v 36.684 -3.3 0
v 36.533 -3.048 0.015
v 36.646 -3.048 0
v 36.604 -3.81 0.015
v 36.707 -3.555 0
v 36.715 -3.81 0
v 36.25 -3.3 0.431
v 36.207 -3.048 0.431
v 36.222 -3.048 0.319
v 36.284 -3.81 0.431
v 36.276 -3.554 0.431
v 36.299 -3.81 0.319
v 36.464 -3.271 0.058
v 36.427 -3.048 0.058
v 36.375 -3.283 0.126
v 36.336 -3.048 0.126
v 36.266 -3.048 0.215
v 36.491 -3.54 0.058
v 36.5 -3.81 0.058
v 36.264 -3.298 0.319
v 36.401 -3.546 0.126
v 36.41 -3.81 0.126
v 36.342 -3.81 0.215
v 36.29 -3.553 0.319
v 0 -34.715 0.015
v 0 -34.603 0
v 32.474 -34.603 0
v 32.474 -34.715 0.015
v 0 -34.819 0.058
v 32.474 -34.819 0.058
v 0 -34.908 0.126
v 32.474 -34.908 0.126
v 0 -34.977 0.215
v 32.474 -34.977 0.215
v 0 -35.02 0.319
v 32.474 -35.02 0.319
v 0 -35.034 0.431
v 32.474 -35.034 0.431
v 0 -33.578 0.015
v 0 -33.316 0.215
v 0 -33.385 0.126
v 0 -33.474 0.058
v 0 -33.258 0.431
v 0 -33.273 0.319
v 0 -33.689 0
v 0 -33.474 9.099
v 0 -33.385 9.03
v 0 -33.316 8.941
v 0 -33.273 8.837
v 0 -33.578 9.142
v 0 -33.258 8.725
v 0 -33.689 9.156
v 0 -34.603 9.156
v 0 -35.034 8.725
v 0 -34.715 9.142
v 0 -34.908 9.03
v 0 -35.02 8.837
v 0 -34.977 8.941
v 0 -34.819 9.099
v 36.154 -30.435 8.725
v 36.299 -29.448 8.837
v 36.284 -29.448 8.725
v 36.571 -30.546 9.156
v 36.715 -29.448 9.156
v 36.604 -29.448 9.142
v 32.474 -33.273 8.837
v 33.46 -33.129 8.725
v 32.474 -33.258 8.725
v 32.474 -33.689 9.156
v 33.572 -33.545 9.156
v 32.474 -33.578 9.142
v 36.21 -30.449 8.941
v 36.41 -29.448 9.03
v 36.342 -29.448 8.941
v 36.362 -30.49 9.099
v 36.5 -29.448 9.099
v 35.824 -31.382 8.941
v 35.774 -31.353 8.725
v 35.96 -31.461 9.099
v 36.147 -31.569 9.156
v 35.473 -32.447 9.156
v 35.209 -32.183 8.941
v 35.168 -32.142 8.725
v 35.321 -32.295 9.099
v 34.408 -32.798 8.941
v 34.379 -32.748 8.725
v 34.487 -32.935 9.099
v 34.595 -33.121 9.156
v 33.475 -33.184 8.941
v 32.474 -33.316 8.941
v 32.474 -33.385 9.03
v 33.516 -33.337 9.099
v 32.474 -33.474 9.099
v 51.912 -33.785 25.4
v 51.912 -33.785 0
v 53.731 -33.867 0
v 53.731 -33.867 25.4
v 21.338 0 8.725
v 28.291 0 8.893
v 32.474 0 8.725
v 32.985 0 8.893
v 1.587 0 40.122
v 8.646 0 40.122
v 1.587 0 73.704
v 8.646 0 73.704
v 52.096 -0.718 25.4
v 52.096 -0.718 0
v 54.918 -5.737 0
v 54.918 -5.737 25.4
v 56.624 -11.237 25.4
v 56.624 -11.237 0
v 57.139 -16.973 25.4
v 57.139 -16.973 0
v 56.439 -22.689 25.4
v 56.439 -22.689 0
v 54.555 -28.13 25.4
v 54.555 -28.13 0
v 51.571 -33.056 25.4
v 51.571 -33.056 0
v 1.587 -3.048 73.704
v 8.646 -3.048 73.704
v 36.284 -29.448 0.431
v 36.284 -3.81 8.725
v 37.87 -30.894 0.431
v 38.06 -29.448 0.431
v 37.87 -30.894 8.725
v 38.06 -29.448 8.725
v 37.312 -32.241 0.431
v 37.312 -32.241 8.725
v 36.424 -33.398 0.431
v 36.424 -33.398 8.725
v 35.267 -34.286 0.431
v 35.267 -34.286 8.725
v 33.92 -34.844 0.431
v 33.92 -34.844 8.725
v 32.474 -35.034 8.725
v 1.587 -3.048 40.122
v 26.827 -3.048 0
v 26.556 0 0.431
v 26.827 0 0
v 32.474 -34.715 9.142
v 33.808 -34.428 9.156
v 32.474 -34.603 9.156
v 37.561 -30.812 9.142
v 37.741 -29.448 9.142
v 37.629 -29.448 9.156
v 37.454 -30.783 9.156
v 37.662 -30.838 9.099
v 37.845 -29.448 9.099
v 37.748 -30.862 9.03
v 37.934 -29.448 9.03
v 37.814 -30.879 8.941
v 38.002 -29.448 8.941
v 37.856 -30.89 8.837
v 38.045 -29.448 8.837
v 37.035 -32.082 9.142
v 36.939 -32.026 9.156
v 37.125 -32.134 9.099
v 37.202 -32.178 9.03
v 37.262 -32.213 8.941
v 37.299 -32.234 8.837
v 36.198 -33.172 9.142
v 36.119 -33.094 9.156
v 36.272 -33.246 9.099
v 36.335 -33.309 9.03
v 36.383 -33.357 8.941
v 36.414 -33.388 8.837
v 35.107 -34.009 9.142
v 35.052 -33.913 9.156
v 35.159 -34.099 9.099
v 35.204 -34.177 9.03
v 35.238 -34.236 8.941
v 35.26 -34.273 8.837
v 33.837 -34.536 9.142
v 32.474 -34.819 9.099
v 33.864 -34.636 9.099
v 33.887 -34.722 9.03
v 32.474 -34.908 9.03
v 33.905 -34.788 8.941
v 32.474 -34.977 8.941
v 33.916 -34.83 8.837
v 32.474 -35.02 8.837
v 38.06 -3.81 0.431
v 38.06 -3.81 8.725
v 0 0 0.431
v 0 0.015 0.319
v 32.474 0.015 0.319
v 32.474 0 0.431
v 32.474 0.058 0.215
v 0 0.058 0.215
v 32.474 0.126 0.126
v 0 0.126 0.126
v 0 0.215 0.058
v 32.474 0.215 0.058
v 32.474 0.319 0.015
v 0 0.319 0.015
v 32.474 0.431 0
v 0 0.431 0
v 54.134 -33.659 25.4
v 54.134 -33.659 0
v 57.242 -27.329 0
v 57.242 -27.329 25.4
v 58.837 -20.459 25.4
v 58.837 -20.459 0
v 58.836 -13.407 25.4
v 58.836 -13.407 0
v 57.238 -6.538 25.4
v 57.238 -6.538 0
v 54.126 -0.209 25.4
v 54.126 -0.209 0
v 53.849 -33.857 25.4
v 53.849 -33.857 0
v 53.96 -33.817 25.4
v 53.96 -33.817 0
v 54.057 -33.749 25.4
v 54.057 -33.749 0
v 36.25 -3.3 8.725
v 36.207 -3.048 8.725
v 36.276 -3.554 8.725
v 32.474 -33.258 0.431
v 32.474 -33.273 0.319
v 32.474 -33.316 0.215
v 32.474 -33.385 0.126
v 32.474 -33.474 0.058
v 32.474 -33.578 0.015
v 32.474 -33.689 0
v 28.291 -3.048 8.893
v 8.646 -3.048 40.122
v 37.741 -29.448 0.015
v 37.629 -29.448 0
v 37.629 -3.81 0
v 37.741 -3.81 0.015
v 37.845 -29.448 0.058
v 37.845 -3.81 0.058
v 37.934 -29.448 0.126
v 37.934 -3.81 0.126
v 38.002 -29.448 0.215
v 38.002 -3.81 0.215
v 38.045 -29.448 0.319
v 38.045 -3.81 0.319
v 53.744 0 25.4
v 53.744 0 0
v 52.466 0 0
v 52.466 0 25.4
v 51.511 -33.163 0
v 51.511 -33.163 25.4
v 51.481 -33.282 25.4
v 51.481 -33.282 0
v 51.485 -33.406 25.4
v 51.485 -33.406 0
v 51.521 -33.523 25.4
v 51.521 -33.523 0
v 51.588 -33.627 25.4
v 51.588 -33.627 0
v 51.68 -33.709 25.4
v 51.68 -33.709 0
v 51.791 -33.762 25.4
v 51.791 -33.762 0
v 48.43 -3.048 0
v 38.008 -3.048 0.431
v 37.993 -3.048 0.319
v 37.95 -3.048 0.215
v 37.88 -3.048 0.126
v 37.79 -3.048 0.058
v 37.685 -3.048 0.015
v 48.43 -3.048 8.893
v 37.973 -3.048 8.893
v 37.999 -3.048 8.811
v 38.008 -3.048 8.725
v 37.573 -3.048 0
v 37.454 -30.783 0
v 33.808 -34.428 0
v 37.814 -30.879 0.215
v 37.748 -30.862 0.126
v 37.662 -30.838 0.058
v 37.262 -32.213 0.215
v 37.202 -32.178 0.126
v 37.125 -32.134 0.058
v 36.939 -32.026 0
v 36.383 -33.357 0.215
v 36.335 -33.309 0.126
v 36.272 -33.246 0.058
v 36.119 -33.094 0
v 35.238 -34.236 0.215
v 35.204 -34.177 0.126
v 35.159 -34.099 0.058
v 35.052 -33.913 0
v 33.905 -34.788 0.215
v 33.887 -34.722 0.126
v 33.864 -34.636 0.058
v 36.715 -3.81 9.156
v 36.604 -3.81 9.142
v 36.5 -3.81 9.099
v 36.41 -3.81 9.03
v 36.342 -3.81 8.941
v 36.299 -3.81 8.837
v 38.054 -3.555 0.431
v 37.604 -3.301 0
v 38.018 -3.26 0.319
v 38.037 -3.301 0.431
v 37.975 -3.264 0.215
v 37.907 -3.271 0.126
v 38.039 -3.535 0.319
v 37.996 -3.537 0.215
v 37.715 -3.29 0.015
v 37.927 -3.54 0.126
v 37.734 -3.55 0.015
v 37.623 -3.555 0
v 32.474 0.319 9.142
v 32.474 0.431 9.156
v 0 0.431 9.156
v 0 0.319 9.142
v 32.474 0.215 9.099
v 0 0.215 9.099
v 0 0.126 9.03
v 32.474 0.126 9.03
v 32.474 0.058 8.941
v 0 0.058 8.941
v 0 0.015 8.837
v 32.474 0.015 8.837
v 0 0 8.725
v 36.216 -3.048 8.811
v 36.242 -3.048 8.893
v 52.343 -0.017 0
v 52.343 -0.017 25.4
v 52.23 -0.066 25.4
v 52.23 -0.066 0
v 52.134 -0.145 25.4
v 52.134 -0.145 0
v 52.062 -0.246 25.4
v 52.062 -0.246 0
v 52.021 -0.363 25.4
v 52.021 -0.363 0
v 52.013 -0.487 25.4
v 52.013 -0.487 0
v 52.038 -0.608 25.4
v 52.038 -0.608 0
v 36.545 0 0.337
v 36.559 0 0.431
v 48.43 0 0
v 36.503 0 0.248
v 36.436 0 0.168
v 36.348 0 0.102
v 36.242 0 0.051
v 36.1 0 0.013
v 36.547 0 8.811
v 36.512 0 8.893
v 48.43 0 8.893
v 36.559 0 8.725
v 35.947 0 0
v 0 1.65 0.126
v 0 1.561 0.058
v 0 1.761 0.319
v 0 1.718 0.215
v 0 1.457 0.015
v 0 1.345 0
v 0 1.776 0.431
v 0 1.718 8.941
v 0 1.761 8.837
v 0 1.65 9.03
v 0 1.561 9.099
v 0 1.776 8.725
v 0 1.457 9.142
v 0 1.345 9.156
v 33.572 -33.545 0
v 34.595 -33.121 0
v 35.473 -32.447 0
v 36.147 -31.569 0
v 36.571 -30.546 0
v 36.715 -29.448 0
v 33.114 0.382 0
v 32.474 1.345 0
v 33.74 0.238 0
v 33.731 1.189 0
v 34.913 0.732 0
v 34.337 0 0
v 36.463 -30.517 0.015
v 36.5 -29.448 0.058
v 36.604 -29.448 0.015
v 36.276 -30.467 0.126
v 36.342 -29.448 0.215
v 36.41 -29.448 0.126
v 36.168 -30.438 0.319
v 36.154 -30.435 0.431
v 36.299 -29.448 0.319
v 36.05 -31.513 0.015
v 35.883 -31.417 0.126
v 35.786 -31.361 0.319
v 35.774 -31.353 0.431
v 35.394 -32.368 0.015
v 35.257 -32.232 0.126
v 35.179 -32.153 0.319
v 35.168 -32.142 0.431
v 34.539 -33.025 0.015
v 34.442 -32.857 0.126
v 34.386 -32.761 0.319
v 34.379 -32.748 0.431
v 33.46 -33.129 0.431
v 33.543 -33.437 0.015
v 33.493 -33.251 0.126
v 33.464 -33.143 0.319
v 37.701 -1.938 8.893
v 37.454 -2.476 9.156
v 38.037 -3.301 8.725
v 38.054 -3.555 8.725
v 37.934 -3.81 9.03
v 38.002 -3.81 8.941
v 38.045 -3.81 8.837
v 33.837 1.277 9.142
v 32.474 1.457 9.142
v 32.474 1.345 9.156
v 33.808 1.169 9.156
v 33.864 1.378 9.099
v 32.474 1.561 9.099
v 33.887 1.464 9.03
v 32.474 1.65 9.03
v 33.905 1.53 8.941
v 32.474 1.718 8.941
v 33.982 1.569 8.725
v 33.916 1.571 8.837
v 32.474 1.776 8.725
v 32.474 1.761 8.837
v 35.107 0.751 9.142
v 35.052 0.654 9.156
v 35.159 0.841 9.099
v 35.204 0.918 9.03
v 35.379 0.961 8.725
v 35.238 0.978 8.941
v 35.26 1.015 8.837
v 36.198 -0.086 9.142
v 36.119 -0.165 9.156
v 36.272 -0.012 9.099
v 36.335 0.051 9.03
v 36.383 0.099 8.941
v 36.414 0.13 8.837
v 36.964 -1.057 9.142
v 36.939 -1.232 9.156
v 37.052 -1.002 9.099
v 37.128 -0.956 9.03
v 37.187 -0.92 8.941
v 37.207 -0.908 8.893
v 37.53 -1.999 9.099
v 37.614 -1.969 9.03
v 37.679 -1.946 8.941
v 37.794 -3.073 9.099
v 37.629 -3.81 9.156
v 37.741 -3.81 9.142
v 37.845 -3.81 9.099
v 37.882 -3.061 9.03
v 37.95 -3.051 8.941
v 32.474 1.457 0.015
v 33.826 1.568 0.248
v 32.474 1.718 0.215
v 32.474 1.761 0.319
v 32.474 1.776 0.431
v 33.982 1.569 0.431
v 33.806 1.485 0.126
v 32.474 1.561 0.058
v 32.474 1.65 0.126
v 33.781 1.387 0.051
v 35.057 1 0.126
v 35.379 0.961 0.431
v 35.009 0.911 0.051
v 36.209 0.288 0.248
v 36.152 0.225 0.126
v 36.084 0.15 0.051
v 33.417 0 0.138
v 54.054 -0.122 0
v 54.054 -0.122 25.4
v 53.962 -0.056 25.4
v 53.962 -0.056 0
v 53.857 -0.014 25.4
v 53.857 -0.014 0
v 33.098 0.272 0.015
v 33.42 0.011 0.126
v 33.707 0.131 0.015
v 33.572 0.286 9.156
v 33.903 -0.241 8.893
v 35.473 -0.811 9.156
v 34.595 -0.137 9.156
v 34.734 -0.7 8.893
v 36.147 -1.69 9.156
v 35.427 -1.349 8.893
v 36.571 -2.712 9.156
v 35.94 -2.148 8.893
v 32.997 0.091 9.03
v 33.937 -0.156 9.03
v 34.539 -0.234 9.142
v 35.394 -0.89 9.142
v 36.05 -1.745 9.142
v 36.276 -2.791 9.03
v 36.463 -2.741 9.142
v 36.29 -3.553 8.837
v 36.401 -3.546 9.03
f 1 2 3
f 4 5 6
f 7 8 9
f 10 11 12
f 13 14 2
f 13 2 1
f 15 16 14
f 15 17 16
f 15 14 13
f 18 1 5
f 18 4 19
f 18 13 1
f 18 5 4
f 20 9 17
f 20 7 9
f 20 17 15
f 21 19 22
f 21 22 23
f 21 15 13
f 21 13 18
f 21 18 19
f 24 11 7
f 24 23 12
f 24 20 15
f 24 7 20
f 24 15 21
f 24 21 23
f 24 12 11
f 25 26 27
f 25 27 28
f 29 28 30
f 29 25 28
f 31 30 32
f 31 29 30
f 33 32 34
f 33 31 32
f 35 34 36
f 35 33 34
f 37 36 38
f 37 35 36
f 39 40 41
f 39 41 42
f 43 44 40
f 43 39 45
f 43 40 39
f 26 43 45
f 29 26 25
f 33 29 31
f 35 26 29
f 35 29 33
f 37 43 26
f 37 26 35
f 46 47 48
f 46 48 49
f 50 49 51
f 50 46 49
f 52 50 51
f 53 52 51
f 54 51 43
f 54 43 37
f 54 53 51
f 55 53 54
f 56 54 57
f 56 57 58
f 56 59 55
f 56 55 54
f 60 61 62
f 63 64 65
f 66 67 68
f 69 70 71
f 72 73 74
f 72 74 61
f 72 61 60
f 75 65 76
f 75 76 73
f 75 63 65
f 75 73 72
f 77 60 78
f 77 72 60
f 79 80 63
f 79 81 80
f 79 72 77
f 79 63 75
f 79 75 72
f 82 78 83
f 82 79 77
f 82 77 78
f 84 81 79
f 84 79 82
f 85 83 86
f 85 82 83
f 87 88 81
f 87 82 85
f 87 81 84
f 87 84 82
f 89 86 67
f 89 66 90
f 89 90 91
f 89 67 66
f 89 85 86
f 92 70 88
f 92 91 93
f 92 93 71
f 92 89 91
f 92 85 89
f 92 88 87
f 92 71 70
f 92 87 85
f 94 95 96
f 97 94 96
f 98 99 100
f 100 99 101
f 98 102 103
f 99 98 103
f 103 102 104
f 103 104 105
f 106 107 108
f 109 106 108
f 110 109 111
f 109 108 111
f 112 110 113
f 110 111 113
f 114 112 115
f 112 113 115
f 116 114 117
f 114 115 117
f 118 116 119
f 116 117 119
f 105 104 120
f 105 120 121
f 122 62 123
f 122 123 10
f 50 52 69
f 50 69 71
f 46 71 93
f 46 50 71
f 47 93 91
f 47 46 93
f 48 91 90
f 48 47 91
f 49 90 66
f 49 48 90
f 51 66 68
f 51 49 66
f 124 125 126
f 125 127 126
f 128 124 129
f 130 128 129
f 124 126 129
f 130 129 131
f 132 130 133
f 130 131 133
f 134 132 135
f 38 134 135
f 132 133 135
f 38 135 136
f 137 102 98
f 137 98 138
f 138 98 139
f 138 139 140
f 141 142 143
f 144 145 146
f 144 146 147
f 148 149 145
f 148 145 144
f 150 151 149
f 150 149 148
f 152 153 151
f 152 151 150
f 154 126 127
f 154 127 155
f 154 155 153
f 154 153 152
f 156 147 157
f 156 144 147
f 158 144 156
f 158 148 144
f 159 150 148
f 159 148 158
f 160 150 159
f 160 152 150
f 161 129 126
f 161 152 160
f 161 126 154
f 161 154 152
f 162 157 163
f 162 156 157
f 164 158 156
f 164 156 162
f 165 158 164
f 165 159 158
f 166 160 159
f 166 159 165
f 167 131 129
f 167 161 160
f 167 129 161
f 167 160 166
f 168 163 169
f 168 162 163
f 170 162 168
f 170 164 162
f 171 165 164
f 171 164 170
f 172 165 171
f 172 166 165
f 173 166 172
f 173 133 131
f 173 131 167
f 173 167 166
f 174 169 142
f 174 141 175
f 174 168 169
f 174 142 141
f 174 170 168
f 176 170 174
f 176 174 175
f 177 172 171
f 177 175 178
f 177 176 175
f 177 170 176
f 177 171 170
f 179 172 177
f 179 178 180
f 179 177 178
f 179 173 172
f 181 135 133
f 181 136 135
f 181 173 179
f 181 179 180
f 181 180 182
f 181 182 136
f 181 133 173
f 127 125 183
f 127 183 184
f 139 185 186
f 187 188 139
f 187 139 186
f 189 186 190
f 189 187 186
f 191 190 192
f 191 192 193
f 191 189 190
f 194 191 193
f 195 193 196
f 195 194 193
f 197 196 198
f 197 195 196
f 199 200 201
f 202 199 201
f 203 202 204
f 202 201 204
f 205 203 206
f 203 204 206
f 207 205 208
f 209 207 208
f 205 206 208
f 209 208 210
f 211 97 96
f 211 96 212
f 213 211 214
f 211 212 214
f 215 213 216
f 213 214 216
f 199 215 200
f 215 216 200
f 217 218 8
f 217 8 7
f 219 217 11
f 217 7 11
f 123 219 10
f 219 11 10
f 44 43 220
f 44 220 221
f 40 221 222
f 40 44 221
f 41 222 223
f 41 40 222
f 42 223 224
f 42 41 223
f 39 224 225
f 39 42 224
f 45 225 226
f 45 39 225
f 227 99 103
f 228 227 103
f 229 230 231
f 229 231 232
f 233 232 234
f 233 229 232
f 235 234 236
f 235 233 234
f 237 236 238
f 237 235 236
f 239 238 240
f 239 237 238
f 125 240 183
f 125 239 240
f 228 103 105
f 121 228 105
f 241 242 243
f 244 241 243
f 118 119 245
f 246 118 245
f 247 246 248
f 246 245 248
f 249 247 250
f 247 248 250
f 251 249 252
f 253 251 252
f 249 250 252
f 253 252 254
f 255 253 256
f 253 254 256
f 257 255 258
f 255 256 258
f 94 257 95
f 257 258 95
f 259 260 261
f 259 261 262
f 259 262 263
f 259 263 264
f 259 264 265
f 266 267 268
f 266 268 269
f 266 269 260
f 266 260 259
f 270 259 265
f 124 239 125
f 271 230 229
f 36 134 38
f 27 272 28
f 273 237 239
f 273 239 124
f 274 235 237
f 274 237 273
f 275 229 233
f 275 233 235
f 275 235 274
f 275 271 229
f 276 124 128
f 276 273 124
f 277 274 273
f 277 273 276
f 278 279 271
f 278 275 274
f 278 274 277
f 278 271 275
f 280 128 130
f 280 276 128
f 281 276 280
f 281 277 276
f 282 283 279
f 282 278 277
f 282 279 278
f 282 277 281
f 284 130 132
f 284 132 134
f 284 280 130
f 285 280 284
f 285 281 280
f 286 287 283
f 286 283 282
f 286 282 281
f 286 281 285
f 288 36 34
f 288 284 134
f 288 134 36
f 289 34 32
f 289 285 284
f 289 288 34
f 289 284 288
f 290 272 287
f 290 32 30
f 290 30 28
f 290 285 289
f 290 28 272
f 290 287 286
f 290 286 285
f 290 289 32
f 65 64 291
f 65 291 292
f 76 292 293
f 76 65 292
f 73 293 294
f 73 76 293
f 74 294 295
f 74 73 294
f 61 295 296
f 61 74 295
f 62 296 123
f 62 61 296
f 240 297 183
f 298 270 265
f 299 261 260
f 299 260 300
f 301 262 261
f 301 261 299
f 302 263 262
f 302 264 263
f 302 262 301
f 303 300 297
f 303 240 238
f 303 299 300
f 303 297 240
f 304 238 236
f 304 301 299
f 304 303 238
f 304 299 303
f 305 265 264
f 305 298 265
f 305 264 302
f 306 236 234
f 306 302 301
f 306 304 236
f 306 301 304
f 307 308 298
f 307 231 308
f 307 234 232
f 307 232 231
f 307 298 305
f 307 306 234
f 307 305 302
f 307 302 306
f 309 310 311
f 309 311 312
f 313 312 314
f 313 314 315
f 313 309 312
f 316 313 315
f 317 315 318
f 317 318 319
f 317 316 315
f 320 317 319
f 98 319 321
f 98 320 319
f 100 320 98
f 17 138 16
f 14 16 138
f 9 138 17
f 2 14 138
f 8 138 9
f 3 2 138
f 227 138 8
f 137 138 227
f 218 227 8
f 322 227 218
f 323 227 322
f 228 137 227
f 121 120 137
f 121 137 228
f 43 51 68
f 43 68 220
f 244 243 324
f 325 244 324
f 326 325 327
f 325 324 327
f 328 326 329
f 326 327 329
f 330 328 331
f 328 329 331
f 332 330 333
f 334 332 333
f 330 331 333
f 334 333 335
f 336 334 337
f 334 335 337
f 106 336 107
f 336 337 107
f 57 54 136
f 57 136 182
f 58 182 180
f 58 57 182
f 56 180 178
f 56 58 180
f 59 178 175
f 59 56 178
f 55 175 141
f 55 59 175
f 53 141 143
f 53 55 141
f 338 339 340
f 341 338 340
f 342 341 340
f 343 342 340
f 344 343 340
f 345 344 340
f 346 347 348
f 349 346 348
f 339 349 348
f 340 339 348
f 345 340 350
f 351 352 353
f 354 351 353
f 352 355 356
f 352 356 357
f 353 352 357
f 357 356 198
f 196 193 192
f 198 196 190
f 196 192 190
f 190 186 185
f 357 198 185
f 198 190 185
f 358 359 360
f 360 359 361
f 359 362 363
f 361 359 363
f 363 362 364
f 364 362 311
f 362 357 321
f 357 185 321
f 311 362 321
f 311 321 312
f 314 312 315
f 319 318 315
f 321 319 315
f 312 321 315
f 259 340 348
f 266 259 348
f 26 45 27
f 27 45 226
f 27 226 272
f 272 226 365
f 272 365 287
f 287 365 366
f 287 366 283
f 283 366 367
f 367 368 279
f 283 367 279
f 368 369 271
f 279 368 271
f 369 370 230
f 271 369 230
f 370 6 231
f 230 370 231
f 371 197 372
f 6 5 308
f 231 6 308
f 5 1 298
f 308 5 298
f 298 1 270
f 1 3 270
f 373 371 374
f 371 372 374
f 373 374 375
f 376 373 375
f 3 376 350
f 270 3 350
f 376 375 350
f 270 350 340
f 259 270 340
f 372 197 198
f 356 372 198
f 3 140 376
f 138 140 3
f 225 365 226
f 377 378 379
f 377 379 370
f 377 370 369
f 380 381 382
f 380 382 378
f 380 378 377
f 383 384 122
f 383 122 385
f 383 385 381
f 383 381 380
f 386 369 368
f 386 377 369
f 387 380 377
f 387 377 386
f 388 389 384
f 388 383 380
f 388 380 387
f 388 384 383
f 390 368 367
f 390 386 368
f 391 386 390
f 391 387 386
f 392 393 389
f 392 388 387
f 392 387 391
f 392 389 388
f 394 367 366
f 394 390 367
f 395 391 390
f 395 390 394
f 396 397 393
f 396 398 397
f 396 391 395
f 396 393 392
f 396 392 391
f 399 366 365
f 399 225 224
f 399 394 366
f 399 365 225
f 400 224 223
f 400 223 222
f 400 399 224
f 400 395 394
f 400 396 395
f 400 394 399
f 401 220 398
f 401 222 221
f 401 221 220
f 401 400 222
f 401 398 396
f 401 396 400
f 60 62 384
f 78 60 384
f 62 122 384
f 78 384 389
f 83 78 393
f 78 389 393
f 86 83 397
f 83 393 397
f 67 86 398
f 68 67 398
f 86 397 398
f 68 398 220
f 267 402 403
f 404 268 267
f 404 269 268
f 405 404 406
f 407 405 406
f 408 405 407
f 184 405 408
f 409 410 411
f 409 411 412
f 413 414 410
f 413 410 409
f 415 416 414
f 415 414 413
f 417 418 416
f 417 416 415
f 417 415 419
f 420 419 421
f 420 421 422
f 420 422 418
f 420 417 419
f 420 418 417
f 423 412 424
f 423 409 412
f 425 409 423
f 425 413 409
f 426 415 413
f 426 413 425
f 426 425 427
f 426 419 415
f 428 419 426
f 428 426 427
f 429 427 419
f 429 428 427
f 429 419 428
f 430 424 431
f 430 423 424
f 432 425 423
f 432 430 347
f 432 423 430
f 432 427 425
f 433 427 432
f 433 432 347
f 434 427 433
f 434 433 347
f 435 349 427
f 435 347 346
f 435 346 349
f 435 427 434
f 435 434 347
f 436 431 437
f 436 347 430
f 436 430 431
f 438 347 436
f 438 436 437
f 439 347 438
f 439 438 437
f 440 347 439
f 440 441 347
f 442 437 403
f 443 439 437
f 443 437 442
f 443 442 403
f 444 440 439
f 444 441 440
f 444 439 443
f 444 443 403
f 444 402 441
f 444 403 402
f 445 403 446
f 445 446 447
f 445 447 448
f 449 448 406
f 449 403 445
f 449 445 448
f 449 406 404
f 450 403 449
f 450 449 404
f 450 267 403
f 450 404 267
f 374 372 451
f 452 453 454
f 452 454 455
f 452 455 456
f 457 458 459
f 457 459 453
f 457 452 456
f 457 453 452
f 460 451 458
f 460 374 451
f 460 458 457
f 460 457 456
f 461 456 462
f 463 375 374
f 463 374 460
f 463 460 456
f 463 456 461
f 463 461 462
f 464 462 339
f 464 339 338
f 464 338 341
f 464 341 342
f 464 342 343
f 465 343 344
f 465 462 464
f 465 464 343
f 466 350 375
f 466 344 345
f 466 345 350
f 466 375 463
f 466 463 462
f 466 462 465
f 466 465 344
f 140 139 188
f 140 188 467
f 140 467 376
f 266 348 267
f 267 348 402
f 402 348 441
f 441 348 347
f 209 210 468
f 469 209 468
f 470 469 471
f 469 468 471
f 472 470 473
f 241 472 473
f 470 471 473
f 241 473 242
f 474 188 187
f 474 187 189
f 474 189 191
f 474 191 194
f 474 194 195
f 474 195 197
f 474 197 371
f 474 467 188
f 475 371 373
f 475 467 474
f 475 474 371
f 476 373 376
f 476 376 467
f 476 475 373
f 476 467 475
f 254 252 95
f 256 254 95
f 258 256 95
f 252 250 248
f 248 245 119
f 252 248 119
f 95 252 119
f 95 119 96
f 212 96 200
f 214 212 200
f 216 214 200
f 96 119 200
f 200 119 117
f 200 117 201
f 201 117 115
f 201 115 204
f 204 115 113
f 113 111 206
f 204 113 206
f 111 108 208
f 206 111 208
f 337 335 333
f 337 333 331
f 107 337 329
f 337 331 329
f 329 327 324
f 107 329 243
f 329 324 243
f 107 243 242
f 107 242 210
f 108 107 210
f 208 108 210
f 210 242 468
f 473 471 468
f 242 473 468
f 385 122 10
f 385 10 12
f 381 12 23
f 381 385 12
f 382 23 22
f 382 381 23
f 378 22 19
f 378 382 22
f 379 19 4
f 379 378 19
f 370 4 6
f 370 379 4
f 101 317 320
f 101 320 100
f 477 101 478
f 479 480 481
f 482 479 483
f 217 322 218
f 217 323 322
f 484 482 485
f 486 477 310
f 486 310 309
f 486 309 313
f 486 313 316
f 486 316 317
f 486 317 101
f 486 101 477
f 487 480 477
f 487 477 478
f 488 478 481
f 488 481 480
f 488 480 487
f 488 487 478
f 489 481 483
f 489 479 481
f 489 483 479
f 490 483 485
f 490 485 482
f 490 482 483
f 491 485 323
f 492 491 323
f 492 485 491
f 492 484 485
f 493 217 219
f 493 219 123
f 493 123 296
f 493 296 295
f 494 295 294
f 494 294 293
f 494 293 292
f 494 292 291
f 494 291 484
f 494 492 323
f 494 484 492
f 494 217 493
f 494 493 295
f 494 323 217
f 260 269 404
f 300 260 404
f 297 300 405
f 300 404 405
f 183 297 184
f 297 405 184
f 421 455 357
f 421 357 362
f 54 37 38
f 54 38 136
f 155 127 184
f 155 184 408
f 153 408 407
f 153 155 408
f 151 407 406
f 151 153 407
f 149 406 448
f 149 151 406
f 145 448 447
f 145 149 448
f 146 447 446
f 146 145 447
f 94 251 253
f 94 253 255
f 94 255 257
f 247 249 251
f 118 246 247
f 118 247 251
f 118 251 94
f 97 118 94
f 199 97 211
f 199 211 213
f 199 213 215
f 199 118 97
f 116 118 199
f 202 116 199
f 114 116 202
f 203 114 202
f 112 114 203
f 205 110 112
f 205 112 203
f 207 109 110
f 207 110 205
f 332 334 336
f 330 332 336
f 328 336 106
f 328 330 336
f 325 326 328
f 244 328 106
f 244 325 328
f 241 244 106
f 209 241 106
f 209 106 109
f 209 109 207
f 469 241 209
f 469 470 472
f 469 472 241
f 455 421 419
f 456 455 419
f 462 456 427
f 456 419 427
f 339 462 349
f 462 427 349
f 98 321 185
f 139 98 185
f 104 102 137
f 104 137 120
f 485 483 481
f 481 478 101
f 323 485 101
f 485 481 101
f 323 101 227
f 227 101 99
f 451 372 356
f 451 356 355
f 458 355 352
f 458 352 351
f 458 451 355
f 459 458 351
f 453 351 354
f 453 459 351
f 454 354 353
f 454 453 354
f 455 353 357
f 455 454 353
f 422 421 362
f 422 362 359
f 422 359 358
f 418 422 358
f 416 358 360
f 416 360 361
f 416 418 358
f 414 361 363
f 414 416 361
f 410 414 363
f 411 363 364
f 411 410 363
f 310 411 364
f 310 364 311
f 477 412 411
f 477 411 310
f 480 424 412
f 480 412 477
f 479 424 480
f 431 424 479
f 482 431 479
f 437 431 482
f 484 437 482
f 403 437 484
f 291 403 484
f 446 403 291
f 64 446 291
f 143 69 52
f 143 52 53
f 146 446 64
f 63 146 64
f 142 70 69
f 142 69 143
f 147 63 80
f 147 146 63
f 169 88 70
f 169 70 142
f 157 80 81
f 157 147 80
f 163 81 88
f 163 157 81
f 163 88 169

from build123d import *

# Parameters (mm, degrees)
F5_DEPTH = 25.4
F6_W     = 7.058582
F6_H     = 33.581745
F7_DEPTH = 3.048


with BuildPart() as f2:
    # F2: sweep along a path in F0
    with BuildLine(Plane.XY) as f2_path:
        Line((0, 0), (32.474126, 0))
        ThreePointArc((32.474126, 0), (35.168203, -1.115923), (36.284126, -3.81))
        Line((36.284126, -3.81), (36.284126, -29.448423))
        ThreePointArc((36.284126, -29.448423), (35.168203, -32.1425), (32.474126, -33.258423))
        Line((32.474126, -33.258423), (0, -33.258423))
    # F1 (on Right) → F2 (sweep)
    with BuildSketch(Plane.YZ):
        with BuildLine():
            Line((0, 8.725308), (0, 0.430952))
            ThreePointArc((0, 0.430952), (0.126223, 0.126223), (0.430952, 0))
            Line((0.430952, 0), (1.345038, 0))
            ThreePointArc((1.345038, 0), (1.649766, 0.126223), (1.775989, 0.430952))
            Line((1.775989, 0.430952), (1.775989, 8.725308))
            ThreePointArc((1.775989, 8.725308), (1.649766, 9.030036), (1.345038, 9.156259))
            Line((1.345038, 9.156259), (0.430952, 9.156259))
            ThreePointArc((0.430952, 9.156259), (0.126223, 9.030036), (0, 8.725308))
        make_face()
    sweep(path=f2_path.line)

    # F6 (on Front) → F7 (join)
    with BuildSketch(Plane.XZ):
        Polygon((1.587123, 40.12217), (26.826905, 0), (26.826905, 8.893286), (28.29096, 8.893286), (8.645705, 40.12217), align=None)
        with Locations((5.116414, 56.913042)):
            Rectangle(F6_W, F6_H)
        Polygon((33.885487, 0), (48.002653, 0), (48.430447, 0), (48.430447, 8.893286), (28.29096, 8.893286), align=None)
        Polygon((26.826905, 0), (33.885487, 0), (28.29096, 8.893286), (26.826905, 8.893286), align=None)
    extrude(amount=F7_DEPTH)


with BuildPart() as f5:
    # F3 (on Top) → F5 (new body)
    with BuildSketch(Plane.XY):
        with BuildLine():
            ThreePointArc((53.73077, -33.867376), (53.960206, -33.817039), (54.133862, -33.658868))
            ThreePointArc((54.133862, -33.658868), (59.037975, -16.932751), (54.126455, -0.208807))
            ThreePointArc((54.126455, -0.208807), (53.961932, -0.055603), (53.744108, 0))
            Line((53.744108, 0), (52.466234, 0))
            ThreePointArc((52.466234, 0), (52.062386, -0.246033), (52.095803, -0.717742))
            ThreePointArc((52.095803, -0.717742), (57.138975, -16.972726), (51.571178, -33.055566))
            ThreePointArc((51.571178, -33.055566), (51.52122, -33.523275), (51.912239, -33.784717))
            Line((51.912239, -33.784717), (53.73077, -33.867376))
        make_face()
    extrude(amount=F5_DEPTH)


solid = Compound([f2.part, f5.part])
